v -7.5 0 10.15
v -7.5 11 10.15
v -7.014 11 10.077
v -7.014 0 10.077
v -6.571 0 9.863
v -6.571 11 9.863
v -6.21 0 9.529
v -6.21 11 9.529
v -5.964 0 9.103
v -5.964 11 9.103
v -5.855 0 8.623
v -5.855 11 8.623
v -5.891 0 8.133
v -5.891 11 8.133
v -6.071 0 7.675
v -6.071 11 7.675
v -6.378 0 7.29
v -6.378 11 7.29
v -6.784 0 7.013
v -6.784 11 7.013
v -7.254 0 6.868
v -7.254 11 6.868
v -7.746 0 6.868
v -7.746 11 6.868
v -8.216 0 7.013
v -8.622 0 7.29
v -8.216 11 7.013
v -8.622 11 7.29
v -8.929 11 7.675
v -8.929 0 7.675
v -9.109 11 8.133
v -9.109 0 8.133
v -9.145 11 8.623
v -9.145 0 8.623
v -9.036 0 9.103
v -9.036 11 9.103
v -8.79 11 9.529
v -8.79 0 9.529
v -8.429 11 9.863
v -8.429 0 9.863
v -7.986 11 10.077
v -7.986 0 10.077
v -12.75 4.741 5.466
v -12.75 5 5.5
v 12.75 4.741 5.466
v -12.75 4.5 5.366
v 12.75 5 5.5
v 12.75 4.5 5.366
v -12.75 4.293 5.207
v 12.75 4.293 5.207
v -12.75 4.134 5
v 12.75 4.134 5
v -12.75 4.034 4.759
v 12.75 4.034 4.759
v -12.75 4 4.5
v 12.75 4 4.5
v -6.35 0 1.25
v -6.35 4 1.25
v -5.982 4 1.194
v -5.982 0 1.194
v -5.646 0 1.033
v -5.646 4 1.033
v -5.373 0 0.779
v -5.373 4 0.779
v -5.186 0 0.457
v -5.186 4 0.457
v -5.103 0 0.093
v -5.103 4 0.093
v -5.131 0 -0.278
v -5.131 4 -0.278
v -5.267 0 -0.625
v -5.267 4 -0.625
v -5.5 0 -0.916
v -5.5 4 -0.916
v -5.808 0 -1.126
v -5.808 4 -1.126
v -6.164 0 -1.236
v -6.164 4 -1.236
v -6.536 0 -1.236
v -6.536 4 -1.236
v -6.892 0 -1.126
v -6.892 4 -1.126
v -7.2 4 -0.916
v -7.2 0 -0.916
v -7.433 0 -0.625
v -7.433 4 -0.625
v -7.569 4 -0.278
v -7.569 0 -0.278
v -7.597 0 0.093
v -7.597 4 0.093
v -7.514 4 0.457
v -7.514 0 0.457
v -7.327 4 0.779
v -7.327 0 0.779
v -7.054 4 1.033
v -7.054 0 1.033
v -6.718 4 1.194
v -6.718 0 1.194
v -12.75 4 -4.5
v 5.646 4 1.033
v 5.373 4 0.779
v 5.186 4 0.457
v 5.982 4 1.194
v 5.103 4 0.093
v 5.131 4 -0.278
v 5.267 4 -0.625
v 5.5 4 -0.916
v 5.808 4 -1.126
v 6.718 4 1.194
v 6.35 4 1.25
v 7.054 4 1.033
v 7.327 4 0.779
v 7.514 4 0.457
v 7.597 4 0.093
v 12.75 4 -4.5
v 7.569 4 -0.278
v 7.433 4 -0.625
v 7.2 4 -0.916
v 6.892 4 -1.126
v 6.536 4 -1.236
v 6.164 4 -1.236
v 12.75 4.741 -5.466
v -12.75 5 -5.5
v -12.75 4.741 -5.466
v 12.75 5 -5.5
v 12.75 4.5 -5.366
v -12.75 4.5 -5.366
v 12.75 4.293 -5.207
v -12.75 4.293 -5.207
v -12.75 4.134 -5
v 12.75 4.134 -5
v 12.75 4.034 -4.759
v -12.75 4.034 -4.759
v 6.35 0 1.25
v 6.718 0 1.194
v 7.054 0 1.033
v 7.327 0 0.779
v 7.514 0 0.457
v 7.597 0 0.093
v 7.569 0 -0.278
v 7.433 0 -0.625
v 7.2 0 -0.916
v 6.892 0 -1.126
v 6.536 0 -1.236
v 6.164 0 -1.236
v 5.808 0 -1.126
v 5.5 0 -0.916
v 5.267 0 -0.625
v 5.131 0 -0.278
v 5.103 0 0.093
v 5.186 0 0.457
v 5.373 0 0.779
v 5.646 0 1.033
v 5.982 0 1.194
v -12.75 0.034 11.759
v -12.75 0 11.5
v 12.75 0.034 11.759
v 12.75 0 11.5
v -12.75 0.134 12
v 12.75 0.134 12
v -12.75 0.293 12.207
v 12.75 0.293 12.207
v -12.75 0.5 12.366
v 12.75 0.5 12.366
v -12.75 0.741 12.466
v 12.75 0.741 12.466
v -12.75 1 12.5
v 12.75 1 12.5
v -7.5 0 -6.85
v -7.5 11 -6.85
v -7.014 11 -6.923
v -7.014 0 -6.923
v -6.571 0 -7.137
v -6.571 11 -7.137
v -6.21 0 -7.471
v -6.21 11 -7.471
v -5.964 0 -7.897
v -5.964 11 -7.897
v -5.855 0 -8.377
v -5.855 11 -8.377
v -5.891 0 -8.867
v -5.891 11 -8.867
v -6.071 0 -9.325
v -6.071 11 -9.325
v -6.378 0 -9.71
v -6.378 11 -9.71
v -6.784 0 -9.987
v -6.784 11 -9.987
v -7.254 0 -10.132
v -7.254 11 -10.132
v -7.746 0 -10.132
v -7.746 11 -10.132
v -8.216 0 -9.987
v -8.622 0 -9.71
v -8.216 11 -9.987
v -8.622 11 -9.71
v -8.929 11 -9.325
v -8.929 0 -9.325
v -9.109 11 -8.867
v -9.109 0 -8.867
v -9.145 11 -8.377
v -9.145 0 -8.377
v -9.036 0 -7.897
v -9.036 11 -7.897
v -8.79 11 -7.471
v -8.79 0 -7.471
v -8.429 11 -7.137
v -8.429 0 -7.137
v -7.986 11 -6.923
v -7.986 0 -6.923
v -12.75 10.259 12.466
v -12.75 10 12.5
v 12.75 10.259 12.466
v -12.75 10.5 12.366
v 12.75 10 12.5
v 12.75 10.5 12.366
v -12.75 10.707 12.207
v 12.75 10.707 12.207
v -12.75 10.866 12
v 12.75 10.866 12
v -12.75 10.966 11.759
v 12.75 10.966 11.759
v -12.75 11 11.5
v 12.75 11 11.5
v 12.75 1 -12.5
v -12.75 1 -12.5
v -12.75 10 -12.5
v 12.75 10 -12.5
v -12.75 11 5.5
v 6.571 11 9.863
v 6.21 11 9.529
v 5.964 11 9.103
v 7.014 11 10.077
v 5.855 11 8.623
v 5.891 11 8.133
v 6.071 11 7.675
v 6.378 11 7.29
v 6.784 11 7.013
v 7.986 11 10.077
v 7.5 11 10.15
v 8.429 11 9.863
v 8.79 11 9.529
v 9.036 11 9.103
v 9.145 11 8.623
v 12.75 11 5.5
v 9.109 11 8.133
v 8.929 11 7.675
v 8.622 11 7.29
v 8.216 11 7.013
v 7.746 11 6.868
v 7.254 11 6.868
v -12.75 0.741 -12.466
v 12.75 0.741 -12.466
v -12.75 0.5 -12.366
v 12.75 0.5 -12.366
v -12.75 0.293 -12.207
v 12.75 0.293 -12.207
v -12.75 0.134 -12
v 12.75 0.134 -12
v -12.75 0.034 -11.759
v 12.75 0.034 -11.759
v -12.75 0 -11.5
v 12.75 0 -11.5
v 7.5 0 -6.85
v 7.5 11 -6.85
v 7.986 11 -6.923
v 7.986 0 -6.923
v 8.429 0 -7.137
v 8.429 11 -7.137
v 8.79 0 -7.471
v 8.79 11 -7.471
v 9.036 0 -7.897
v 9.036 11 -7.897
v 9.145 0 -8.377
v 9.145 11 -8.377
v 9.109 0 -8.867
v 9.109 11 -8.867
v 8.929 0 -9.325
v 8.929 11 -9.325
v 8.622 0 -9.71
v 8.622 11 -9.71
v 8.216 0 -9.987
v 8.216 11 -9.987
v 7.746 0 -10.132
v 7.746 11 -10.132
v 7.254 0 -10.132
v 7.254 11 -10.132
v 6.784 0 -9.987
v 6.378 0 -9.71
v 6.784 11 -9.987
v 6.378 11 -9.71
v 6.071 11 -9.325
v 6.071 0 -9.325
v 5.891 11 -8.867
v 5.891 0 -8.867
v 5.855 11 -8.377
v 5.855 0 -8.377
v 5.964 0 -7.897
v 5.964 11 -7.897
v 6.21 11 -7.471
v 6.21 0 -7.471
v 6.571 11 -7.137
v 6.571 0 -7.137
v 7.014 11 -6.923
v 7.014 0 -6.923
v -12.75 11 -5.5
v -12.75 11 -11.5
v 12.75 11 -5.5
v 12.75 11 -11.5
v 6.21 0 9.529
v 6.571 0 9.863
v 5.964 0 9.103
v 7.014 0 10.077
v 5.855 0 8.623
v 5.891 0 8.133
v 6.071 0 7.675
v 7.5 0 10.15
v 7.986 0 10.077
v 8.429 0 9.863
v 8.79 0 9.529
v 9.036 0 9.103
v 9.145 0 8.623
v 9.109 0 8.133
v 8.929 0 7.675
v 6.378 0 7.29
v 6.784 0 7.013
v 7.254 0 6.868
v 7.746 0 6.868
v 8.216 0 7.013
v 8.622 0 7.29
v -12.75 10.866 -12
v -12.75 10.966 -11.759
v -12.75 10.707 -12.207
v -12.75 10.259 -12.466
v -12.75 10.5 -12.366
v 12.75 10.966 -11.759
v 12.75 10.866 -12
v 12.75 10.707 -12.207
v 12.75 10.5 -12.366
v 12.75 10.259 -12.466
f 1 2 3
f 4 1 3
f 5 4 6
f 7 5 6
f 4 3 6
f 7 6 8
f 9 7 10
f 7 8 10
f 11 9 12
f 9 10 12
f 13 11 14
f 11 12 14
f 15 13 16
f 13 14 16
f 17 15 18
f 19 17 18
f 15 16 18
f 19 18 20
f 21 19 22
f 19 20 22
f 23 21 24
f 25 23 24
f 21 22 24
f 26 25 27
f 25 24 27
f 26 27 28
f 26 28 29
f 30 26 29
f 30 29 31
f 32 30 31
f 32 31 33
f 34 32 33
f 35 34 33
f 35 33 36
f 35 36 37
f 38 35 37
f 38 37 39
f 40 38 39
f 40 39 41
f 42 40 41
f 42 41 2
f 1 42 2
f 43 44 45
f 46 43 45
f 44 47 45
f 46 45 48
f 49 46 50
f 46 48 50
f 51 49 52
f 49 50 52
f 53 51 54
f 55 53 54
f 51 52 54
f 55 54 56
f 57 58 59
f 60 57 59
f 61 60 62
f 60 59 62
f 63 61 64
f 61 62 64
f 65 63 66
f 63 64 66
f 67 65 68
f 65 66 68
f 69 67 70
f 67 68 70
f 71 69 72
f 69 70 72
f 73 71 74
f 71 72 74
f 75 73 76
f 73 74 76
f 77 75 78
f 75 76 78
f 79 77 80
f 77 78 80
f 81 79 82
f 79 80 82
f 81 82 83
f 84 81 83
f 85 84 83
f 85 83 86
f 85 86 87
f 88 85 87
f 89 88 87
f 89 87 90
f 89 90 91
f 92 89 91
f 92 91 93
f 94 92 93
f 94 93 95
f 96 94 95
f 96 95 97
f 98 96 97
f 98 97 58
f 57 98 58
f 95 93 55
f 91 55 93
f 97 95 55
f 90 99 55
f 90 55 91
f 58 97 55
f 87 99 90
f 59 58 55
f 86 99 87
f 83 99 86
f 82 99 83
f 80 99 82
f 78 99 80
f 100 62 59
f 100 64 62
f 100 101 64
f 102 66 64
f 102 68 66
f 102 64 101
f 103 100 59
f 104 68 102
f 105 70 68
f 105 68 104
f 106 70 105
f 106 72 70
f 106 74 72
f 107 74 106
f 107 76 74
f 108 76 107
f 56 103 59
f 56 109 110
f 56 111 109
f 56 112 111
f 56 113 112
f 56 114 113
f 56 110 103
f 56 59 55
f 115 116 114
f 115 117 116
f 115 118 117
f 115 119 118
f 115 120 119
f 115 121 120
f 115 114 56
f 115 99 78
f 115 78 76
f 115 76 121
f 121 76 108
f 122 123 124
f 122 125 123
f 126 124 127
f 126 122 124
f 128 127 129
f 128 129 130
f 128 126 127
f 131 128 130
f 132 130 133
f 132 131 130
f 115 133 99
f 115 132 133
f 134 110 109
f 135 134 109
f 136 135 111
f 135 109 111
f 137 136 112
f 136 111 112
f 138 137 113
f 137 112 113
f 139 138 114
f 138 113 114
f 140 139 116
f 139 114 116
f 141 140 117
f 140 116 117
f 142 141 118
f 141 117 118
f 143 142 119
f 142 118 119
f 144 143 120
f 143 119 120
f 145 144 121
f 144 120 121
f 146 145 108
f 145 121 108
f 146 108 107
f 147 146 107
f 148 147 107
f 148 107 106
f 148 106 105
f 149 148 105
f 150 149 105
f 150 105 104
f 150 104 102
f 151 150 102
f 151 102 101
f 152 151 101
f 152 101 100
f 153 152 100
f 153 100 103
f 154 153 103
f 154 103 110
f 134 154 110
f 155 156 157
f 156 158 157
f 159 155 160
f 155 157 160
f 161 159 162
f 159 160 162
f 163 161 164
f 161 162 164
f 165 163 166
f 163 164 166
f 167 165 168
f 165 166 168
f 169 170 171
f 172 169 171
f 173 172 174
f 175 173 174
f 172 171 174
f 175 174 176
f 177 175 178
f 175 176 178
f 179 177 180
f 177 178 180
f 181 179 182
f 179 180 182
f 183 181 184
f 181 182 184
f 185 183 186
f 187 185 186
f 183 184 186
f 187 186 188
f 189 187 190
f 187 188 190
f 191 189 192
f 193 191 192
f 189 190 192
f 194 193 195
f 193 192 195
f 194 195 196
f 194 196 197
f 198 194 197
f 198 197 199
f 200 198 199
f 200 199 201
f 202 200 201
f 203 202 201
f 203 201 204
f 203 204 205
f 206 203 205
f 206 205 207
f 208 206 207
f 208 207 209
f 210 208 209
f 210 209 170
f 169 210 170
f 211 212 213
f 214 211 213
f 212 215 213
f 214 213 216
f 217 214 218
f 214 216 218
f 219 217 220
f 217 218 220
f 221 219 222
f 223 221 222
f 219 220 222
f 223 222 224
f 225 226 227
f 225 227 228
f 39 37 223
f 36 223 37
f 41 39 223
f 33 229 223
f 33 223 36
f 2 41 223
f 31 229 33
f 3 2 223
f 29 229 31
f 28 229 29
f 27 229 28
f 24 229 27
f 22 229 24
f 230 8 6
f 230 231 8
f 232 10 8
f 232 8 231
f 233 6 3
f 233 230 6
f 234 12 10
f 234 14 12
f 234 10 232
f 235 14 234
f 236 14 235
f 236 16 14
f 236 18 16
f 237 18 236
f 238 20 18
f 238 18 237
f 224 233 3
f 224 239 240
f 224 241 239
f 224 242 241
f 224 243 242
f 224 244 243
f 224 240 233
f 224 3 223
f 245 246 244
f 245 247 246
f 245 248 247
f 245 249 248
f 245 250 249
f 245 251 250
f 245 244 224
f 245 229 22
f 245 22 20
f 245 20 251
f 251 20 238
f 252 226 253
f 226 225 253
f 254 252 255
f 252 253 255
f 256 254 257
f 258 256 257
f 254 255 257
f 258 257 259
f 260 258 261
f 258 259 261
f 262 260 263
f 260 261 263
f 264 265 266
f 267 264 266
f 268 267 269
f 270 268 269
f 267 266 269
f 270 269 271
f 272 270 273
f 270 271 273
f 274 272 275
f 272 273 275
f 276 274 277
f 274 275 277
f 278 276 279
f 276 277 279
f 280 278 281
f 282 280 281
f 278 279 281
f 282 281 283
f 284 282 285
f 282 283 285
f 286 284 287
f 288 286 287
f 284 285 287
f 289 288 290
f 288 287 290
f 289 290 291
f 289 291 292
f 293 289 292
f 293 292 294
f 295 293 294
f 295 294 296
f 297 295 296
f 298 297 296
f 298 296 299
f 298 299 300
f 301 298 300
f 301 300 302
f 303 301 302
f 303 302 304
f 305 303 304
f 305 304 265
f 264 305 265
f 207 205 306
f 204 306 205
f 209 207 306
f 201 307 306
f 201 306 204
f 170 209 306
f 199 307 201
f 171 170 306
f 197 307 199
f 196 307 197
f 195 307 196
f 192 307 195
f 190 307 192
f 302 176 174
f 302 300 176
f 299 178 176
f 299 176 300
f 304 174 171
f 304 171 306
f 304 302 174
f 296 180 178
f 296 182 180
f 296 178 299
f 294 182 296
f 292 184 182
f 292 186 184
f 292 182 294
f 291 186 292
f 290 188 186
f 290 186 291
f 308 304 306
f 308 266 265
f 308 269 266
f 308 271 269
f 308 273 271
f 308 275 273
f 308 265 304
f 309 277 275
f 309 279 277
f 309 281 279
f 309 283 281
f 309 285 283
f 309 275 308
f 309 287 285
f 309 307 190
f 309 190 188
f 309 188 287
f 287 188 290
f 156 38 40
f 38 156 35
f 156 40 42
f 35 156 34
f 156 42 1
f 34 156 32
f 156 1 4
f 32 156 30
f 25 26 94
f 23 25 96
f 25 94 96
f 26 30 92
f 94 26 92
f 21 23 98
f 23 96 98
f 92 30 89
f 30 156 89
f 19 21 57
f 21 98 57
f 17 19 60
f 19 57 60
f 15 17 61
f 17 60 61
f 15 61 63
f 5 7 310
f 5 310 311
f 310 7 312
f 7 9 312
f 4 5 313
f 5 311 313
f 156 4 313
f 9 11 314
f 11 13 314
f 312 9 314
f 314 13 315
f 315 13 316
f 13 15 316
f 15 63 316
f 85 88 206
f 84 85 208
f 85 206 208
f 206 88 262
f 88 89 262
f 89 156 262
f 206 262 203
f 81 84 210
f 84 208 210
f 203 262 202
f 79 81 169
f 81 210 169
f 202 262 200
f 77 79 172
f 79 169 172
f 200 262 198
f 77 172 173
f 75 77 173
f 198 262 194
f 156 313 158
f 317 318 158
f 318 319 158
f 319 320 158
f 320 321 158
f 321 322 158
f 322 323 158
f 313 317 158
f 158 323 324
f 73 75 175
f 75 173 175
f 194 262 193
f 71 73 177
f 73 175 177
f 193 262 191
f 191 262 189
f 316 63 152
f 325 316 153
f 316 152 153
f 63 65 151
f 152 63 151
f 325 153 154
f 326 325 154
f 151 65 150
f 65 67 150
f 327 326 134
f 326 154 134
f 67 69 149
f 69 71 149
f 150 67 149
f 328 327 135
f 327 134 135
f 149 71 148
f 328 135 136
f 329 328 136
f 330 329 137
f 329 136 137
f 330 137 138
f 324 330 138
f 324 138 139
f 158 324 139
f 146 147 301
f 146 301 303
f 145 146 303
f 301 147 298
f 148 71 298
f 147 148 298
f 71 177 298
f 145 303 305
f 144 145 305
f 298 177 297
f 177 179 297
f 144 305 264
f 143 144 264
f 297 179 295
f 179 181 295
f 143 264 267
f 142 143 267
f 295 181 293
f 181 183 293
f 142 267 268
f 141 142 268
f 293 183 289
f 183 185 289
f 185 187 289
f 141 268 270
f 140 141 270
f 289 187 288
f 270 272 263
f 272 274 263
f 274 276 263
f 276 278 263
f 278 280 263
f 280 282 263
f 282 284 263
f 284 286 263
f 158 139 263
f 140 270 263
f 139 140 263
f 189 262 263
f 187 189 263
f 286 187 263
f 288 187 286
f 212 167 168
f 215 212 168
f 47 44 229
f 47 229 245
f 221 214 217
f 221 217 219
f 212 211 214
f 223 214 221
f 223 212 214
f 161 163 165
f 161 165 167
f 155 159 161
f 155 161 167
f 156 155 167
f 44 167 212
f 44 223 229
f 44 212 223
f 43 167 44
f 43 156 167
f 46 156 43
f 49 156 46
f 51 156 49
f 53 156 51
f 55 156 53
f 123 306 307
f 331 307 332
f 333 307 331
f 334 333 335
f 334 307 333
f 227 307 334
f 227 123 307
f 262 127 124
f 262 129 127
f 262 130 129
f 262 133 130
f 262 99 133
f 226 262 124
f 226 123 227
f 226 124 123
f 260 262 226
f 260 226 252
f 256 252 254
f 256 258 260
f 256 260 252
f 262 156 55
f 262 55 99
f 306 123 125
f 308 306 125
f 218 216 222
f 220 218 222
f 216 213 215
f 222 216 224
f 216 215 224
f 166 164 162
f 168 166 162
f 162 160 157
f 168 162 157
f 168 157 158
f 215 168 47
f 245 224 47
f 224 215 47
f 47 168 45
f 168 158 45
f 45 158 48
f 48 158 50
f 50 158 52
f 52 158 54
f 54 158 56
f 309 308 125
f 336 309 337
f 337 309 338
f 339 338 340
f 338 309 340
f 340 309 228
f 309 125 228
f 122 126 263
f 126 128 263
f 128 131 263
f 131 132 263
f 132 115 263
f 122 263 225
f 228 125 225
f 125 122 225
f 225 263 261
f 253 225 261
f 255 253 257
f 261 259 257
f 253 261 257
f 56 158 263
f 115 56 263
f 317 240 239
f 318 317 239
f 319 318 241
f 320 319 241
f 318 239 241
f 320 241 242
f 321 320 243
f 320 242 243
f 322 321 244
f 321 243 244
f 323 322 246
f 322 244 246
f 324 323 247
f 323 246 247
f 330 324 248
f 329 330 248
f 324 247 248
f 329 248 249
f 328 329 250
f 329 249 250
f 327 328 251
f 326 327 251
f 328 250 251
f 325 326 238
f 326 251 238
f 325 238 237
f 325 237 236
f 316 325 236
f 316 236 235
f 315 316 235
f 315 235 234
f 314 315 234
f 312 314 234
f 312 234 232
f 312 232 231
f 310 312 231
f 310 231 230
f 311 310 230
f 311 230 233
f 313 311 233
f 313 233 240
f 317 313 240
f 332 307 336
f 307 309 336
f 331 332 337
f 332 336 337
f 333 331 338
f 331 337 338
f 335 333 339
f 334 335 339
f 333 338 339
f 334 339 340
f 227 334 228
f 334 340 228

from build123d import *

# Parameters (mm, degrees)
SKETCH_1_W         = 25.5
SKETCH_1_H         = 25
EXTRUDE_1_DEPTH    = 4
SKETCH_6_W         = 25.5
SKETCH_6_H         = 7
EXTRUDE_2_DEPTH    = 7
HOLE_WIZARD_M3_1_D = 2.5
HOLE_WIZARD_M4_3_D = 3.3
FILLET_1_R         = 1


with BuildPart() as part:
    # 草图1 → 凸台-拉伸1 (new body)
    with BuildSketch(Plane(origin=(0, 0, 0), x_dir=(1, 0, 0), z_dir=(0, 1, 0))):
        Rectangle(SKETCH_1_W, SKETCH_1_H)
    extrude(amount=EXTRUDE_1_DEPTH)

    # 草图6 → 凸台-拉伸2 (add)
    with BuildSketch(Plane(origin=(0, 4, 0), x_dir=(1, 0, 0), z_dir=(0, 1, 0))):
        with Locations((0, 9)):
            Rectangle(SKETCH_6_W, SKETCH_6_H)
        with Locations((0, -9)):
            Rectangle(SKETCH_6_W, SKETCH_6_H)
    extrude(amount=EXTRUDE_2_DEPTH)

    # M3 螺纹孔1 (through all)
    with Locations(Plane(origin=(6.35, 0, 0), x_dir=(0, 0, -1), z_dir=(0, -1, 0))):
        with Locations((0, 0), (0, -12.7)):
            Hole(HOLE_WIZARD_M3_1_D / 2)

    # M4 螺纹孔3 (through all)
    with Locations(Plane(origin=(7.5, 0, 8.5), x_dir=(0, 0, -1), z_dir=(0, -1, 0))):
        with Locations((0, 0), (0, -15), (17, -15), (17, 0)):
            Hole(HOLE_WIZARD_M4_3_D / 2)

    # 圆角1
    fillet_1_edges = [part.edges().sort_by_distance(p)[0] for p in [
        (0, 4, -5.5),
        (0, 11, -12.5),
        (0, 4, 5.5),
        (0, 11, 12.5),
        (0, 0, 12.5),
        (0, 0, -12.5),
    ]]
    fillet(fillet_1_edges, radius=FILLET_1_R)


solid = part.part
